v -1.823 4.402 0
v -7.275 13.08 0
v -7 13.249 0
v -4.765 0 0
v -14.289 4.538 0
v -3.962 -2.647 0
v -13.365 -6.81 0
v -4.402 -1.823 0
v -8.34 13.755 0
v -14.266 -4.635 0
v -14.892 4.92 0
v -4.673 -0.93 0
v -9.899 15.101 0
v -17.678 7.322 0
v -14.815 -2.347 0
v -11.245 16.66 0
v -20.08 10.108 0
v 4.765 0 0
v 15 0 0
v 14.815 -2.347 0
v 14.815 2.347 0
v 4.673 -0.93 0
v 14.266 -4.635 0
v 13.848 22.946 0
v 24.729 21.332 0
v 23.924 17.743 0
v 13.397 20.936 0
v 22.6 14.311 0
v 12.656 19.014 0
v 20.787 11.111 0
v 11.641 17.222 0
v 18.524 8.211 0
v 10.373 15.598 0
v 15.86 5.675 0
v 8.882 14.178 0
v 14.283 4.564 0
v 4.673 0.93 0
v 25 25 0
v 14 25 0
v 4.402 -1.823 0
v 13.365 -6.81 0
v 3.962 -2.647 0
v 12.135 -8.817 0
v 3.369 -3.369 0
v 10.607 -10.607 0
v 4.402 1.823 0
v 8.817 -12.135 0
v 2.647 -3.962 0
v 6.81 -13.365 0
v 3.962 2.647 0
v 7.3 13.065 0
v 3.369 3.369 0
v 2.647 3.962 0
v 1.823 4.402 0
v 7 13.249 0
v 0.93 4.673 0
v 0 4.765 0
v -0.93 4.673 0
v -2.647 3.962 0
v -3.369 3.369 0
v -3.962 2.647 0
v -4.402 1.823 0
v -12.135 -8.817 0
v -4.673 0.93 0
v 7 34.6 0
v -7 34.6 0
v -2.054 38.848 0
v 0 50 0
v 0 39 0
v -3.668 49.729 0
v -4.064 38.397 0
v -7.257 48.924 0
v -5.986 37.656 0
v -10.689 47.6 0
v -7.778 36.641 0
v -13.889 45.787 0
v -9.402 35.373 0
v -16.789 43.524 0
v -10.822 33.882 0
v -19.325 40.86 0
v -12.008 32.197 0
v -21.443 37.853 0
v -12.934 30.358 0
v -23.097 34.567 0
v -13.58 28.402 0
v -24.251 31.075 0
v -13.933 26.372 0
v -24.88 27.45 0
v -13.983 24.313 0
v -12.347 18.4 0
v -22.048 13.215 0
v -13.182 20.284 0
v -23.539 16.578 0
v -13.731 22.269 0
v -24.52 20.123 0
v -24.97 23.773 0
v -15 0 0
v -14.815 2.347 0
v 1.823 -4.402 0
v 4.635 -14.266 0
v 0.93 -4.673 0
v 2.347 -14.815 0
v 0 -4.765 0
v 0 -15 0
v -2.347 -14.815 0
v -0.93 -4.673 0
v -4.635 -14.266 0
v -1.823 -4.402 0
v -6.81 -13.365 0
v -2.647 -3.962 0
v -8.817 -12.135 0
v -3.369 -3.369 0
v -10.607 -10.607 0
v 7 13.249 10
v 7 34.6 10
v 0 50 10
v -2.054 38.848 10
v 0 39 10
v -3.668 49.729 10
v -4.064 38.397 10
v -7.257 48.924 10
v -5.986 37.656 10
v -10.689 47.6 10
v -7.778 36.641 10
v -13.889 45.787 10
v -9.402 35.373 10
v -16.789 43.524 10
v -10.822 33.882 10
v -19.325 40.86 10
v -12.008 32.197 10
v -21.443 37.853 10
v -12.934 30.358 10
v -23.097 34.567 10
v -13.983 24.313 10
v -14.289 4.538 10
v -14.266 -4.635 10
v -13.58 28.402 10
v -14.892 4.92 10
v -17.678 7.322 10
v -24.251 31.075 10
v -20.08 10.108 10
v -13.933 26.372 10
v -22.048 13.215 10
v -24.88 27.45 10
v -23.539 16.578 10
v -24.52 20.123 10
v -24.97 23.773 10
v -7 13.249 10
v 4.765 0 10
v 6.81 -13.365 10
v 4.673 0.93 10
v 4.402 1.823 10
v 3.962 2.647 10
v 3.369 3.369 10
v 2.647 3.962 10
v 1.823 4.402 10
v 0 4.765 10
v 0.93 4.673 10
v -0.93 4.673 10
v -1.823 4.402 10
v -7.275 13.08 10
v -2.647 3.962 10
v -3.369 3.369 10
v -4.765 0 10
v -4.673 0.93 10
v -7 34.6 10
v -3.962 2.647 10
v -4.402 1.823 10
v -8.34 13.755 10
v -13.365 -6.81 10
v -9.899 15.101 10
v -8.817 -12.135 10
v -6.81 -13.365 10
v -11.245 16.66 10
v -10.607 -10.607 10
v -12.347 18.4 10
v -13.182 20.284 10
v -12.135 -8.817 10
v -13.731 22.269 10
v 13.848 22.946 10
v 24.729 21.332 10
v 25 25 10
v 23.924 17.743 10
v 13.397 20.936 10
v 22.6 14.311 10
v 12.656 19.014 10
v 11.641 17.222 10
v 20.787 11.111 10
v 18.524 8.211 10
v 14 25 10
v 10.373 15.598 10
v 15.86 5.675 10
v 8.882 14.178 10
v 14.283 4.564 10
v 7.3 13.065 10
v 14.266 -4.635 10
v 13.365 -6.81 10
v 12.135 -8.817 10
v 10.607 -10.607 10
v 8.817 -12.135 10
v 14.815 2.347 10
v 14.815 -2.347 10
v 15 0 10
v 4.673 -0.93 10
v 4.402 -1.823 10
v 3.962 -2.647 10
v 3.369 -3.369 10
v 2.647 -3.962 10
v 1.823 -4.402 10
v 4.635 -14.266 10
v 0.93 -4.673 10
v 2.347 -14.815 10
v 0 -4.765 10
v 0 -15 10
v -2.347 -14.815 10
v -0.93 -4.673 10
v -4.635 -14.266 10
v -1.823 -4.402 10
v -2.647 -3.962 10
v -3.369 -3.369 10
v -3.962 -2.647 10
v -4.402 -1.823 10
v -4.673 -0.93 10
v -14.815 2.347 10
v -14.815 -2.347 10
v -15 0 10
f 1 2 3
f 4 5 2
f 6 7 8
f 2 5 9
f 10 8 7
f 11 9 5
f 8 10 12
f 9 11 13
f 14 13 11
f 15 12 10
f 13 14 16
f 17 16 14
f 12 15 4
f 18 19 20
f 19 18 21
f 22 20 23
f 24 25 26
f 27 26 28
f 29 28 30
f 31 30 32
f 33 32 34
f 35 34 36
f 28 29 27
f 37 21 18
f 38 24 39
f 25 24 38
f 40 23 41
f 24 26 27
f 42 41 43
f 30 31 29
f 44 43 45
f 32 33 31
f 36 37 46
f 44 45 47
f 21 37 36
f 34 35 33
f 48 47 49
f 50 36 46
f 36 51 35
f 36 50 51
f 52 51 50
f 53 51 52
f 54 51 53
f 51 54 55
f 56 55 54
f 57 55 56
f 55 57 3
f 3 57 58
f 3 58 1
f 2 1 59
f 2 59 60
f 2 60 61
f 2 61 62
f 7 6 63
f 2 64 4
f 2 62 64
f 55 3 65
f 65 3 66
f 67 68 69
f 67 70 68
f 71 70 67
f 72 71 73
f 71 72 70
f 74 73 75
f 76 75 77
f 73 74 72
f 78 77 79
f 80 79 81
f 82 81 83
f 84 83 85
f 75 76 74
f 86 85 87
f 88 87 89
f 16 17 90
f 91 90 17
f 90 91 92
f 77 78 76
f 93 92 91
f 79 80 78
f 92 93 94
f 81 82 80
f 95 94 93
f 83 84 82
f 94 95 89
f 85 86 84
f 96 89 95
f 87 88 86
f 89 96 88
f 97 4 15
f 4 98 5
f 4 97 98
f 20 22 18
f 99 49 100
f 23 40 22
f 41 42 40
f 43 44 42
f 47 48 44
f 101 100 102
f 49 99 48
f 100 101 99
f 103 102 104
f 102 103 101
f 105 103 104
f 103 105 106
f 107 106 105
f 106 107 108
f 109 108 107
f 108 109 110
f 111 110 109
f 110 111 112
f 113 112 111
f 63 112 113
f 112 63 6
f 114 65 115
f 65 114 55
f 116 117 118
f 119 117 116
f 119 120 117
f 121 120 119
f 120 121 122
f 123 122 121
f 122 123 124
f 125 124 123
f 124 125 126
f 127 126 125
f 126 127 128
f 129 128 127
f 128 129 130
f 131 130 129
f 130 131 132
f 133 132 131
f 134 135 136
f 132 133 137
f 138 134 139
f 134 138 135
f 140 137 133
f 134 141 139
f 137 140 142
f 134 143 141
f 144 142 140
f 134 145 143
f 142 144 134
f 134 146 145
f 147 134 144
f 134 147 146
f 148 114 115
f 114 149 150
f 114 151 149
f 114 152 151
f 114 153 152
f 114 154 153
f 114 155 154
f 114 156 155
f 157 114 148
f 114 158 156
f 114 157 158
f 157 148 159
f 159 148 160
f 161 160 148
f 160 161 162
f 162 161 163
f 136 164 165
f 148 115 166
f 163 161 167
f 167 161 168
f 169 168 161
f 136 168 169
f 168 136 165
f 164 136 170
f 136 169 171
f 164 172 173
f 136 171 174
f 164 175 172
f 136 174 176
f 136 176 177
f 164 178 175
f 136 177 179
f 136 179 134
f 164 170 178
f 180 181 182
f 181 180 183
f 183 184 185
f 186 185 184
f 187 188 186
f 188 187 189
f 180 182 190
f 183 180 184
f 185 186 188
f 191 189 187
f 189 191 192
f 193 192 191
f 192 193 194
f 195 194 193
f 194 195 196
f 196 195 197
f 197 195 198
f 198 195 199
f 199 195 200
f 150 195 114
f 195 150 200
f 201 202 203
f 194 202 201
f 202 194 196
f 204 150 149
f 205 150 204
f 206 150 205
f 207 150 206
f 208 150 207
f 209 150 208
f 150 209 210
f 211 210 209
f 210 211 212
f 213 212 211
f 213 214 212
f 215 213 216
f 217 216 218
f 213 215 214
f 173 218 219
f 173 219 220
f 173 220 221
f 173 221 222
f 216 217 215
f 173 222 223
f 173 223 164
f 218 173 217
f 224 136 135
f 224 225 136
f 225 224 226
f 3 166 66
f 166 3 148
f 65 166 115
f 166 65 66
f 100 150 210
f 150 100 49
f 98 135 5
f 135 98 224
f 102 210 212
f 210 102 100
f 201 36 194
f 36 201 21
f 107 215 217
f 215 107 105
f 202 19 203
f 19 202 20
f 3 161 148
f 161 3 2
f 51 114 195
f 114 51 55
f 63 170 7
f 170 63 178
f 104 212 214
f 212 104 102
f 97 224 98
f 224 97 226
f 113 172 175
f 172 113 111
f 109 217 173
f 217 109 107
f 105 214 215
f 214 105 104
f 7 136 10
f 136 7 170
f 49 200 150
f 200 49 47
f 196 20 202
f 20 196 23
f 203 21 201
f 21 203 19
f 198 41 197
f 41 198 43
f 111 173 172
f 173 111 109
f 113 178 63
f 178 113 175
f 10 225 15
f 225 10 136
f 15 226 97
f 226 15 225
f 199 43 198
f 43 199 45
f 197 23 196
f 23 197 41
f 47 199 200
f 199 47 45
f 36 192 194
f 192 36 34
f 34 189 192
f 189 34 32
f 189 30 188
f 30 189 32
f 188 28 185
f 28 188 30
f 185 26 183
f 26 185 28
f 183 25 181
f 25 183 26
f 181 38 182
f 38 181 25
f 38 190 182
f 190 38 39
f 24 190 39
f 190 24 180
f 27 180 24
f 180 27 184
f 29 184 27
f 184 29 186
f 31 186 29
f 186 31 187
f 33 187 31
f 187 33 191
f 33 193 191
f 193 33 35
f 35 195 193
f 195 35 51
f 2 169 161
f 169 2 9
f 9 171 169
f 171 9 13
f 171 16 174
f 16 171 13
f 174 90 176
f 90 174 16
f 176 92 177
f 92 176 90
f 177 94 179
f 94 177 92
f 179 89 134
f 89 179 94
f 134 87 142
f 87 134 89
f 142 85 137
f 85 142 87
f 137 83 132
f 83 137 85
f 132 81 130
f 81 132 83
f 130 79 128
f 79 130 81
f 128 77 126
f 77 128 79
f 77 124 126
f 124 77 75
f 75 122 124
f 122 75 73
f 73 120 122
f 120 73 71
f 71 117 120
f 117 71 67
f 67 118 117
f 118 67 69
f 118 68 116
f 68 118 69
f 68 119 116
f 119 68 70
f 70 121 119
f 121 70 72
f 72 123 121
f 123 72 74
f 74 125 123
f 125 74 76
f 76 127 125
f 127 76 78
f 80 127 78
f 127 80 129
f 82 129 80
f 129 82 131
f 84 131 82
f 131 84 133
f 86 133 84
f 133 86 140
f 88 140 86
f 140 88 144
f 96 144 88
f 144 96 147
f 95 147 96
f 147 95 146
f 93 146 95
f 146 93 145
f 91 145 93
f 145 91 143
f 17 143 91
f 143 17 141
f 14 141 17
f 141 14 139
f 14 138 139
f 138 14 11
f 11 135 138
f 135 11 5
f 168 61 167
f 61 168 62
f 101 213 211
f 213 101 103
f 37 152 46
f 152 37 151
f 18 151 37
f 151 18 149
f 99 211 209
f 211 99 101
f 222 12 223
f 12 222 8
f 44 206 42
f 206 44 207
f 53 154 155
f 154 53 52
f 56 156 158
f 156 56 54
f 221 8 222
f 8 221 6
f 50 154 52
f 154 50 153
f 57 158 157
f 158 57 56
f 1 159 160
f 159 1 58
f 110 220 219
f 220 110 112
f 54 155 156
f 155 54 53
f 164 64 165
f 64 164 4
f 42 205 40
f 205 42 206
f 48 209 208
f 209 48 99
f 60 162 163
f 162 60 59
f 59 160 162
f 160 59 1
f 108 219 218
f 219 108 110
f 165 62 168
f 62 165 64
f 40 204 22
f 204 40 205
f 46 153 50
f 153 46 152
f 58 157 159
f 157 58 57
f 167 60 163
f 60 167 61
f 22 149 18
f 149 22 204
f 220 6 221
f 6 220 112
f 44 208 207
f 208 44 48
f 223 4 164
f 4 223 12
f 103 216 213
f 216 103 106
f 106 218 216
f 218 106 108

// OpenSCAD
$fn = 32;

// ----------------------------------------------------------------------
// Hook: 50 mm shank into a 14 mm curl, 10 mm thick
// ----------------------------------------------------------------------

// --- parameters (mm) ---
shank_len = 50;           // shank length from the boss centre
shank_w = 14;             // shank width
boss_d = 30;              // boss diameter
bore_d = 9.53;            // boss bore
curl_in = 14;             // curl inner radius
curl_out = 25;            // curl outer radius
curl_sweep = 270;         // curl sweep angle
hook_t = 10;              // hook thickness

shank_profile = [[-7, 34.6], [7, 34.6], [7, 13], [-7, 13]];
boss_profile = [[15, 0], [14.815, 2.347], [14.266, 4.635], [13.365, 6.81], [12.135, 8.817], [10.607, 10.607], [8.817, 12.135], [6.81, 13.365], [4.635, 14.266], [2.347, 14.815], [0, 15], [-2.347, 14.815], [-4.635, 14.266], [-6.81, 13.365], [-8.817, 12.135], [-10.607, 10.607], [-12.135, 8.817], [-13.365, 6.81], [-14.266, 4.635], [-14.815, 2.347], [-15, 0], [-14.815, -2.347], [-14.266, -4.635], [-13.365, -6.81], [-12.135, -8.817], [-10.607, -10.607], [-8.817, -12.135], [-6.81, -13.365], [-4.635, -14.266], [-2.347, -14.815], [0, -15], [2.347, -14.815], [4.635, -14.266], [6.81, -13.365], [8.817, -12.135], [10.607, -10.607], [12.135, -8.817], [13.365, -6.81], [14.266, -4.635], [14.815, -2.347]];
curl_profile = [[0, 50], [-3.668, 49.729], [-7.257, 48.924], [-10.689, 47.6], [-13.889, 45.787], [-16.789, 43.524], [-19.325, 40.86], [-21.443, 37.853], [-23.097, 34.567], [-24.251, 31.075], [-24.88, 27.45], [-24.97, 23.773], [-24.52, 20.123], [-23.539, 16.578], [-22.048, 13.215], [-20.08, 10.108], [-17.678, 7.322], [-14.892, 4.92], [-11.785, 2.952], [-8.422, 1.461], [-4.877, 0.48], [-1.227, 0.03], [2.45, 0.12], [6.075, 0.749], [9.567, 1.903], [12.853, 3.557], [15.86, 5.675], [18.524, 8.211], [20.787, 11.111], [22.6, 14.311], [23.924, 17.743], [24.729, 21.332], [25, 25], [14, 25], [13.848, 22.946], [13.397, 20.936], [12.656, 19.014], [11.641, 17.222], [10.373, 15.598], [8.882, 14.178], [7.197, 12.992], [5.358, 12.066], [3.402, 11.42], [1.372, 11.067], [-0.687, 11.017], [-2.731, 11.269], [-4.716, 11.818], [-6.6, 12.653], [-8.34, 13.755], [-9.899, 15.101], [-11.245, 16.66], [-12.347, 18.4], [-13.182, 20.284], [-13.731, 22.269], [-13.983, 24.313], [-13.933, 26.372], [-13.58, 28.402], [-12.934, 30.358], [-12.008, 32.197], [-10.822, 33.882], [-9.402, 35.373], [-7.778, 36.641], [-5.986, 37.656], [-4.064, 38.397], [-2.054, 38.848], [0, 39]];

difference() {
  union() {
    /* three overlapping outlines: shank, boss and the smooth curl */
    linear_extrude(height = hook_t) polygon(shank_profile);
    linear_extrude(height = hook_t) polygon(boss_profile);
    linear_extrude(height = hook_t) polygon(curl_profile);
  }
  translate([0, 0, -2.5]) cylinder(h = hook_t + 5, d = bore_d);
}
